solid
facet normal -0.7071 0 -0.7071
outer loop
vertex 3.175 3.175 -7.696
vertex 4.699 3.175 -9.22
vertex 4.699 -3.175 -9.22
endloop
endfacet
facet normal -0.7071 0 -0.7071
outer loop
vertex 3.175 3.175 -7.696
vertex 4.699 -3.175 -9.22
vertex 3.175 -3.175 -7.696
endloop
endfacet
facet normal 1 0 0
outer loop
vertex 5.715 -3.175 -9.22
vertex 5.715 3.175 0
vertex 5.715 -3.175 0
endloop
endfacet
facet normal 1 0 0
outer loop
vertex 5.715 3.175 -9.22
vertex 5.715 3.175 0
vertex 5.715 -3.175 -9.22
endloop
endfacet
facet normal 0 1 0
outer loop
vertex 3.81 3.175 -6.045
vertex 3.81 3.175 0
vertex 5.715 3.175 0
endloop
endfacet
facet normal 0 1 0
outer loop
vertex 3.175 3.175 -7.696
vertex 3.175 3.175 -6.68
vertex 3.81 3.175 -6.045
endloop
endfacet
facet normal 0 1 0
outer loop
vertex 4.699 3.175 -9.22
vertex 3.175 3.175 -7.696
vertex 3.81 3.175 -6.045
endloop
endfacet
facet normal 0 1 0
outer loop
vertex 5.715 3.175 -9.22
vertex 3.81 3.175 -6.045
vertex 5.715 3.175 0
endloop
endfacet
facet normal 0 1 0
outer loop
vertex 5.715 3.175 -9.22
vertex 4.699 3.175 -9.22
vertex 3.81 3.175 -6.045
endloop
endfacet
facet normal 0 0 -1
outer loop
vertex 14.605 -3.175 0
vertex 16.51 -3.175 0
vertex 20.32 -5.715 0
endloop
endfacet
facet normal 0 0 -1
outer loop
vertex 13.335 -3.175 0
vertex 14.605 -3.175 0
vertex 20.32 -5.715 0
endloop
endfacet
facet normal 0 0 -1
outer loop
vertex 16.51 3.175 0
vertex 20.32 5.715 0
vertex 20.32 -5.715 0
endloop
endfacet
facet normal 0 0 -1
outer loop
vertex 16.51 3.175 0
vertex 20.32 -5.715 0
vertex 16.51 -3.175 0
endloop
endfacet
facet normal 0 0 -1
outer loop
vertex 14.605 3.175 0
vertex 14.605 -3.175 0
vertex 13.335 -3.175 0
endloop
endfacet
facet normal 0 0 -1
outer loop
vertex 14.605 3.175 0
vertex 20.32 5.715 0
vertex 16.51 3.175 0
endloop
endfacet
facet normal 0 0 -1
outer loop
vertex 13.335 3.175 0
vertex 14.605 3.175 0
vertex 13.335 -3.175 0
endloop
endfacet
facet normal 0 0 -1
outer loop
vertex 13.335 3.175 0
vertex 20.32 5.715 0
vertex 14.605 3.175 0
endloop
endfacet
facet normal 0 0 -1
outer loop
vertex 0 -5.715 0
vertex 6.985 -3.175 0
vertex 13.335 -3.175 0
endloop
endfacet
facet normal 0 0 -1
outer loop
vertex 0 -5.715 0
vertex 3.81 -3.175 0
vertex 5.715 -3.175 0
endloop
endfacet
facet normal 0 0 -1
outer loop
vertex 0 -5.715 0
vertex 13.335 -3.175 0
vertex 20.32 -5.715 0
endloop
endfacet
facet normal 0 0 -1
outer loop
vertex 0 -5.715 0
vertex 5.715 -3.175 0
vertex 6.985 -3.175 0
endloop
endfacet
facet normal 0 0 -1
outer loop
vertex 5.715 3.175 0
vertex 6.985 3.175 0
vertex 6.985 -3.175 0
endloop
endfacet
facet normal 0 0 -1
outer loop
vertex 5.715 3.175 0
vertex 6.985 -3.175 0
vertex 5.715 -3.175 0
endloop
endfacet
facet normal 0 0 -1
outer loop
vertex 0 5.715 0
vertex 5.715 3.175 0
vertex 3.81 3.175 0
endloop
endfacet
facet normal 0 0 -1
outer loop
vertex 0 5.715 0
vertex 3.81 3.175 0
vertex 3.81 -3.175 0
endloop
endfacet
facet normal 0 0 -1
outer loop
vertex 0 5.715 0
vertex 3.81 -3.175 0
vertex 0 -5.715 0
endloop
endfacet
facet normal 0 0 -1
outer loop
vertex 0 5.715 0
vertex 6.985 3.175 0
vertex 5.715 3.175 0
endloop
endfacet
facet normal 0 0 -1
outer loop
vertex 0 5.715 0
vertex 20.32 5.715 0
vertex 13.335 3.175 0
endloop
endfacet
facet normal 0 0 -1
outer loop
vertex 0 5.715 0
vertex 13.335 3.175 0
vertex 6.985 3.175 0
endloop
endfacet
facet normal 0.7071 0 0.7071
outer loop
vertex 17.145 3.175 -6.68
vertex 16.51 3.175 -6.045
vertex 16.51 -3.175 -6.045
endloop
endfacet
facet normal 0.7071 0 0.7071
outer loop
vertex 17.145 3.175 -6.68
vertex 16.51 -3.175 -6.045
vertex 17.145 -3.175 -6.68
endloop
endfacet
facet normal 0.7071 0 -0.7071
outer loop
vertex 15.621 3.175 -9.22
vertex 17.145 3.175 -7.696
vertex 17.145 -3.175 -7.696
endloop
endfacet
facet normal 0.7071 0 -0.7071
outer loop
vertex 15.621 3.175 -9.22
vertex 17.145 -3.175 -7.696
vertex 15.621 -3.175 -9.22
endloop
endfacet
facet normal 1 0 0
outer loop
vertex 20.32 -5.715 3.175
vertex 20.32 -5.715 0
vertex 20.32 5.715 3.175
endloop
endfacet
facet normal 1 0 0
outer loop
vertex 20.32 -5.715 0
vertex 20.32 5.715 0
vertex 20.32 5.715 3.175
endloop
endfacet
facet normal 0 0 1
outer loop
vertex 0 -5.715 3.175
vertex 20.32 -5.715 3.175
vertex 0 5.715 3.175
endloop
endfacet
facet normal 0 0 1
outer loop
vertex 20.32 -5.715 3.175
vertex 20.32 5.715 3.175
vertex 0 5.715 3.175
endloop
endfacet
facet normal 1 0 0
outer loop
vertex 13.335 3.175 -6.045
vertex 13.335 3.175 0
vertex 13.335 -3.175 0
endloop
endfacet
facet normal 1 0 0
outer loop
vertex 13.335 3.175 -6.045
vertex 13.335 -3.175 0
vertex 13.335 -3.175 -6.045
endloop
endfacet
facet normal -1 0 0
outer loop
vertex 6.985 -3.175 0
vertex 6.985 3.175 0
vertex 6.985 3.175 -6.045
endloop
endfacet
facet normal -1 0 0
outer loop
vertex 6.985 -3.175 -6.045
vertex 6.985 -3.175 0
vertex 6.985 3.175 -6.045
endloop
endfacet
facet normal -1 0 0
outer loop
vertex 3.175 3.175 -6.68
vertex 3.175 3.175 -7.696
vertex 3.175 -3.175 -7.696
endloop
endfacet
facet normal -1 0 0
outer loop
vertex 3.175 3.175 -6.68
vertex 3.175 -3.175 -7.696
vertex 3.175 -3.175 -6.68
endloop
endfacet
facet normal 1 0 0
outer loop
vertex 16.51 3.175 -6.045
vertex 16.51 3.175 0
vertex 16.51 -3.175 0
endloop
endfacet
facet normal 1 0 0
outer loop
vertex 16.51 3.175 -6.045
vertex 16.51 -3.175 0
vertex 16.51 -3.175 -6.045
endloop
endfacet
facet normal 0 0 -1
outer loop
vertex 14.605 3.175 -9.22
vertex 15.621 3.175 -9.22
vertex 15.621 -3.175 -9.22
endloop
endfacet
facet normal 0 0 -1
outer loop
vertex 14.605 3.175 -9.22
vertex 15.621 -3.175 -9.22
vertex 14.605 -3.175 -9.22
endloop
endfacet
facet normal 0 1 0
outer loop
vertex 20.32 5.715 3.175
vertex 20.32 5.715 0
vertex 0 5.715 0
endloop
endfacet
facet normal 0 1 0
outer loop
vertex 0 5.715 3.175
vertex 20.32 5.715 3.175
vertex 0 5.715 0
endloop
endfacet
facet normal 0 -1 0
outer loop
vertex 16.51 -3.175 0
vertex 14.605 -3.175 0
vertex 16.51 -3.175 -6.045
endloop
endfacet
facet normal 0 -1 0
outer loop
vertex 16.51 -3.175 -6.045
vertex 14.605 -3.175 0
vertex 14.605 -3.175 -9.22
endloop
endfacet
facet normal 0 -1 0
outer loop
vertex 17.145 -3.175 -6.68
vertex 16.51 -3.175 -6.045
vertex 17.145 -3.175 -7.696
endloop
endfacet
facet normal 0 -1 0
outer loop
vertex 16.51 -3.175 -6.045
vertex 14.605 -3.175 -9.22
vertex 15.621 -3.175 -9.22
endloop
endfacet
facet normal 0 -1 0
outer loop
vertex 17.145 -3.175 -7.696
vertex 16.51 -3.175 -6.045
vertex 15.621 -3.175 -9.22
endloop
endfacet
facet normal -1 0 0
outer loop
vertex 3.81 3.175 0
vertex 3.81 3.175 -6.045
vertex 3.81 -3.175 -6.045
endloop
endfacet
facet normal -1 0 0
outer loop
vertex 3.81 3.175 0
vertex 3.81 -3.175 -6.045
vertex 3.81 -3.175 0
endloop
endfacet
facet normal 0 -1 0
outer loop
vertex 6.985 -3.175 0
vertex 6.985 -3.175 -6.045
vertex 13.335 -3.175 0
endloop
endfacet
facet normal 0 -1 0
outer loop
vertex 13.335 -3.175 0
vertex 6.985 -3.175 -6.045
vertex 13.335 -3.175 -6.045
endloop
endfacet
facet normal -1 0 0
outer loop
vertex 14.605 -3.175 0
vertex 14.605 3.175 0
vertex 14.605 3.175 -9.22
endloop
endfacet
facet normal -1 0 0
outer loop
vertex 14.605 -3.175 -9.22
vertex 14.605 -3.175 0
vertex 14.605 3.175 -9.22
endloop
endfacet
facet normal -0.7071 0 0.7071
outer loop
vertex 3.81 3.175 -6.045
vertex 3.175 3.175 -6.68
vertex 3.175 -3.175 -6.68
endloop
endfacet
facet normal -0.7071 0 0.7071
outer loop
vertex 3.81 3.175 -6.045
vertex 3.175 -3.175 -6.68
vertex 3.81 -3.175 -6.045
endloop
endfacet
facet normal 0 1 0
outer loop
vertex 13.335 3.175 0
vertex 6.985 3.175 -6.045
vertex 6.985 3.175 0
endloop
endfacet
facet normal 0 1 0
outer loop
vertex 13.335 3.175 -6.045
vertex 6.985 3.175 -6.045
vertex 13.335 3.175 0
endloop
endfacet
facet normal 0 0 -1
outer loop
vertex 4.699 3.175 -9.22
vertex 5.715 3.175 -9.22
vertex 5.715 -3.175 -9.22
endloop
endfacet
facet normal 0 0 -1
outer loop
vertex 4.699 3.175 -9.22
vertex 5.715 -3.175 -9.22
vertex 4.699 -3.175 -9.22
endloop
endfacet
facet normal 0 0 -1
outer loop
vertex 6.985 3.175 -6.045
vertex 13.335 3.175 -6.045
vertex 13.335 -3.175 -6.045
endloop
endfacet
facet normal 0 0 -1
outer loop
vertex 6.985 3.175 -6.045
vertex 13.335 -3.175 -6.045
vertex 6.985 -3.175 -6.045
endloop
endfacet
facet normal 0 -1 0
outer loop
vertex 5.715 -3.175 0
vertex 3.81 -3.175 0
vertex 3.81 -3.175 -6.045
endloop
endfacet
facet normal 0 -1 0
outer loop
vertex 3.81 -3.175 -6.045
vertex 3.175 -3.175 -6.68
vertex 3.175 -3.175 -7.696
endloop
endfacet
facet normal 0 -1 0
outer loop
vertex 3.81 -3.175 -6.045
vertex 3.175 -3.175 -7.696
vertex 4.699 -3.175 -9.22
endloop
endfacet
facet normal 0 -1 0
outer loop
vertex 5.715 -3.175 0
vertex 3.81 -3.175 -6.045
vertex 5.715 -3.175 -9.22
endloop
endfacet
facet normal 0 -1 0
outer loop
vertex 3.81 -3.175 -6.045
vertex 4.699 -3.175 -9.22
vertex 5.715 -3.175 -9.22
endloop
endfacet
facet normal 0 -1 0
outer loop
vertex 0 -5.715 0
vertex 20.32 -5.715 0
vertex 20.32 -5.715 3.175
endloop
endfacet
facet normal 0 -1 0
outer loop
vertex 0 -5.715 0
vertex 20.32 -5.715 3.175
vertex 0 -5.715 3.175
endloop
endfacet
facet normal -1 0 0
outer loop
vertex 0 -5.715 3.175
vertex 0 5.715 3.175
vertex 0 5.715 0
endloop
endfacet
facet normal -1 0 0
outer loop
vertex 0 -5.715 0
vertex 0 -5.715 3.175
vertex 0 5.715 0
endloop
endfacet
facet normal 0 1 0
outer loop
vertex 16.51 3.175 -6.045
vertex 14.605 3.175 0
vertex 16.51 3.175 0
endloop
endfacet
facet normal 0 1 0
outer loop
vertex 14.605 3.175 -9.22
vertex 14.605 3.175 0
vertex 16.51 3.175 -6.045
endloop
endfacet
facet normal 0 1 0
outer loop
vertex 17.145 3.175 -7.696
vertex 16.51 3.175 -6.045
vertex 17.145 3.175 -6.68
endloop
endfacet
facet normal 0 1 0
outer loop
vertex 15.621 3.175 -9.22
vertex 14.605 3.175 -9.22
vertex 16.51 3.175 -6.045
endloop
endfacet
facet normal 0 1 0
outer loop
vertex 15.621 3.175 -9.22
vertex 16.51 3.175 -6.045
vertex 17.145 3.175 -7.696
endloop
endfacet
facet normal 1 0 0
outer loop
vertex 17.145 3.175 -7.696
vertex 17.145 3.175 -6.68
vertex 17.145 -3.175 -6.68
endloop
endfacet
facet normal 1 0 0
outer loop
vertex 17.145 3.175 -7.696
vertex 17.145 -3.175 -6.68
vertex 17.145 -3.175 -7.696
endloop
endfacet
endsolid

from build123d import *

# Parameters (mm, degrees)
BOSS_EXTRUDE1_DEPTH = 3.175
SKETCH2_W           = 1.27
SKETCH2_H           = 6.0452
CUT_EXTRUDE1_DEPTH  = 6.35
BOSS_EXTRUDE2_DEPTH = 5.715


with BuildPart() as part:
    # Sketch1 → Boss-Extrude1 (new, symmetric)
    with BuildSketch(Plane(origin=(0, 0, 0), x_dir=(1, 0, 0), z_dir=(0, 1, 0))):
        Polygon((3.81, 0), (0, 0), (0, -3.175), (20.32, -3.175), (20.32, 0), (16.51, 0), (16.51, 6.0452), (17.145, 6.6802), (17.145, 7.6962), (15.621, 9.2202), (14.605, 9.2202), (14.605, 6.0452), (5.715, 6.0452), (5.715, 9.2202), (4.699, 9.2202), (3.175, 7.6962), (3.175, 6.6802), (3.81, 6.0452), align=None)
    extrude(amount=BOSS_EXTRUDE1_DEPTH, both=True)

    # Sketch2 → Cut-Extrude1 (cut)
    with BuildSketch(Plane(origin=(0, 3.175, 0), x_dir=(1, 0, 0), z_dir=(0, 1, 0))):
        with Locations((6.35, 3.0226)):
            Rectangle(SKETCH2_W, SKETCH2_H)
        with Locations((13.97, 3.0226)):
            Rectangle(SKETCH2_W, SKETCH2_H)
    extrude(amount=-CUT_EXTRUDE1_DEPTH, mode=Mode.SUBTRACT)

    # Sketch1<3> → Boss-Extrude2 (add, symmetric)
    with BuildSketch(Plane(origin=(0, 0, 0), x_dir=(1, 0, 0), z_dir=(0, 1, 0))):
        Polygon((3.81, 0), (0, 0), (0, -3.175), (20.32, -3.175), (20.32, 0), (16.51, 0), align=None)
    extrude(amount=BOSS_EXTRUDE2_DEPTH, both=True)


solid = part.part
